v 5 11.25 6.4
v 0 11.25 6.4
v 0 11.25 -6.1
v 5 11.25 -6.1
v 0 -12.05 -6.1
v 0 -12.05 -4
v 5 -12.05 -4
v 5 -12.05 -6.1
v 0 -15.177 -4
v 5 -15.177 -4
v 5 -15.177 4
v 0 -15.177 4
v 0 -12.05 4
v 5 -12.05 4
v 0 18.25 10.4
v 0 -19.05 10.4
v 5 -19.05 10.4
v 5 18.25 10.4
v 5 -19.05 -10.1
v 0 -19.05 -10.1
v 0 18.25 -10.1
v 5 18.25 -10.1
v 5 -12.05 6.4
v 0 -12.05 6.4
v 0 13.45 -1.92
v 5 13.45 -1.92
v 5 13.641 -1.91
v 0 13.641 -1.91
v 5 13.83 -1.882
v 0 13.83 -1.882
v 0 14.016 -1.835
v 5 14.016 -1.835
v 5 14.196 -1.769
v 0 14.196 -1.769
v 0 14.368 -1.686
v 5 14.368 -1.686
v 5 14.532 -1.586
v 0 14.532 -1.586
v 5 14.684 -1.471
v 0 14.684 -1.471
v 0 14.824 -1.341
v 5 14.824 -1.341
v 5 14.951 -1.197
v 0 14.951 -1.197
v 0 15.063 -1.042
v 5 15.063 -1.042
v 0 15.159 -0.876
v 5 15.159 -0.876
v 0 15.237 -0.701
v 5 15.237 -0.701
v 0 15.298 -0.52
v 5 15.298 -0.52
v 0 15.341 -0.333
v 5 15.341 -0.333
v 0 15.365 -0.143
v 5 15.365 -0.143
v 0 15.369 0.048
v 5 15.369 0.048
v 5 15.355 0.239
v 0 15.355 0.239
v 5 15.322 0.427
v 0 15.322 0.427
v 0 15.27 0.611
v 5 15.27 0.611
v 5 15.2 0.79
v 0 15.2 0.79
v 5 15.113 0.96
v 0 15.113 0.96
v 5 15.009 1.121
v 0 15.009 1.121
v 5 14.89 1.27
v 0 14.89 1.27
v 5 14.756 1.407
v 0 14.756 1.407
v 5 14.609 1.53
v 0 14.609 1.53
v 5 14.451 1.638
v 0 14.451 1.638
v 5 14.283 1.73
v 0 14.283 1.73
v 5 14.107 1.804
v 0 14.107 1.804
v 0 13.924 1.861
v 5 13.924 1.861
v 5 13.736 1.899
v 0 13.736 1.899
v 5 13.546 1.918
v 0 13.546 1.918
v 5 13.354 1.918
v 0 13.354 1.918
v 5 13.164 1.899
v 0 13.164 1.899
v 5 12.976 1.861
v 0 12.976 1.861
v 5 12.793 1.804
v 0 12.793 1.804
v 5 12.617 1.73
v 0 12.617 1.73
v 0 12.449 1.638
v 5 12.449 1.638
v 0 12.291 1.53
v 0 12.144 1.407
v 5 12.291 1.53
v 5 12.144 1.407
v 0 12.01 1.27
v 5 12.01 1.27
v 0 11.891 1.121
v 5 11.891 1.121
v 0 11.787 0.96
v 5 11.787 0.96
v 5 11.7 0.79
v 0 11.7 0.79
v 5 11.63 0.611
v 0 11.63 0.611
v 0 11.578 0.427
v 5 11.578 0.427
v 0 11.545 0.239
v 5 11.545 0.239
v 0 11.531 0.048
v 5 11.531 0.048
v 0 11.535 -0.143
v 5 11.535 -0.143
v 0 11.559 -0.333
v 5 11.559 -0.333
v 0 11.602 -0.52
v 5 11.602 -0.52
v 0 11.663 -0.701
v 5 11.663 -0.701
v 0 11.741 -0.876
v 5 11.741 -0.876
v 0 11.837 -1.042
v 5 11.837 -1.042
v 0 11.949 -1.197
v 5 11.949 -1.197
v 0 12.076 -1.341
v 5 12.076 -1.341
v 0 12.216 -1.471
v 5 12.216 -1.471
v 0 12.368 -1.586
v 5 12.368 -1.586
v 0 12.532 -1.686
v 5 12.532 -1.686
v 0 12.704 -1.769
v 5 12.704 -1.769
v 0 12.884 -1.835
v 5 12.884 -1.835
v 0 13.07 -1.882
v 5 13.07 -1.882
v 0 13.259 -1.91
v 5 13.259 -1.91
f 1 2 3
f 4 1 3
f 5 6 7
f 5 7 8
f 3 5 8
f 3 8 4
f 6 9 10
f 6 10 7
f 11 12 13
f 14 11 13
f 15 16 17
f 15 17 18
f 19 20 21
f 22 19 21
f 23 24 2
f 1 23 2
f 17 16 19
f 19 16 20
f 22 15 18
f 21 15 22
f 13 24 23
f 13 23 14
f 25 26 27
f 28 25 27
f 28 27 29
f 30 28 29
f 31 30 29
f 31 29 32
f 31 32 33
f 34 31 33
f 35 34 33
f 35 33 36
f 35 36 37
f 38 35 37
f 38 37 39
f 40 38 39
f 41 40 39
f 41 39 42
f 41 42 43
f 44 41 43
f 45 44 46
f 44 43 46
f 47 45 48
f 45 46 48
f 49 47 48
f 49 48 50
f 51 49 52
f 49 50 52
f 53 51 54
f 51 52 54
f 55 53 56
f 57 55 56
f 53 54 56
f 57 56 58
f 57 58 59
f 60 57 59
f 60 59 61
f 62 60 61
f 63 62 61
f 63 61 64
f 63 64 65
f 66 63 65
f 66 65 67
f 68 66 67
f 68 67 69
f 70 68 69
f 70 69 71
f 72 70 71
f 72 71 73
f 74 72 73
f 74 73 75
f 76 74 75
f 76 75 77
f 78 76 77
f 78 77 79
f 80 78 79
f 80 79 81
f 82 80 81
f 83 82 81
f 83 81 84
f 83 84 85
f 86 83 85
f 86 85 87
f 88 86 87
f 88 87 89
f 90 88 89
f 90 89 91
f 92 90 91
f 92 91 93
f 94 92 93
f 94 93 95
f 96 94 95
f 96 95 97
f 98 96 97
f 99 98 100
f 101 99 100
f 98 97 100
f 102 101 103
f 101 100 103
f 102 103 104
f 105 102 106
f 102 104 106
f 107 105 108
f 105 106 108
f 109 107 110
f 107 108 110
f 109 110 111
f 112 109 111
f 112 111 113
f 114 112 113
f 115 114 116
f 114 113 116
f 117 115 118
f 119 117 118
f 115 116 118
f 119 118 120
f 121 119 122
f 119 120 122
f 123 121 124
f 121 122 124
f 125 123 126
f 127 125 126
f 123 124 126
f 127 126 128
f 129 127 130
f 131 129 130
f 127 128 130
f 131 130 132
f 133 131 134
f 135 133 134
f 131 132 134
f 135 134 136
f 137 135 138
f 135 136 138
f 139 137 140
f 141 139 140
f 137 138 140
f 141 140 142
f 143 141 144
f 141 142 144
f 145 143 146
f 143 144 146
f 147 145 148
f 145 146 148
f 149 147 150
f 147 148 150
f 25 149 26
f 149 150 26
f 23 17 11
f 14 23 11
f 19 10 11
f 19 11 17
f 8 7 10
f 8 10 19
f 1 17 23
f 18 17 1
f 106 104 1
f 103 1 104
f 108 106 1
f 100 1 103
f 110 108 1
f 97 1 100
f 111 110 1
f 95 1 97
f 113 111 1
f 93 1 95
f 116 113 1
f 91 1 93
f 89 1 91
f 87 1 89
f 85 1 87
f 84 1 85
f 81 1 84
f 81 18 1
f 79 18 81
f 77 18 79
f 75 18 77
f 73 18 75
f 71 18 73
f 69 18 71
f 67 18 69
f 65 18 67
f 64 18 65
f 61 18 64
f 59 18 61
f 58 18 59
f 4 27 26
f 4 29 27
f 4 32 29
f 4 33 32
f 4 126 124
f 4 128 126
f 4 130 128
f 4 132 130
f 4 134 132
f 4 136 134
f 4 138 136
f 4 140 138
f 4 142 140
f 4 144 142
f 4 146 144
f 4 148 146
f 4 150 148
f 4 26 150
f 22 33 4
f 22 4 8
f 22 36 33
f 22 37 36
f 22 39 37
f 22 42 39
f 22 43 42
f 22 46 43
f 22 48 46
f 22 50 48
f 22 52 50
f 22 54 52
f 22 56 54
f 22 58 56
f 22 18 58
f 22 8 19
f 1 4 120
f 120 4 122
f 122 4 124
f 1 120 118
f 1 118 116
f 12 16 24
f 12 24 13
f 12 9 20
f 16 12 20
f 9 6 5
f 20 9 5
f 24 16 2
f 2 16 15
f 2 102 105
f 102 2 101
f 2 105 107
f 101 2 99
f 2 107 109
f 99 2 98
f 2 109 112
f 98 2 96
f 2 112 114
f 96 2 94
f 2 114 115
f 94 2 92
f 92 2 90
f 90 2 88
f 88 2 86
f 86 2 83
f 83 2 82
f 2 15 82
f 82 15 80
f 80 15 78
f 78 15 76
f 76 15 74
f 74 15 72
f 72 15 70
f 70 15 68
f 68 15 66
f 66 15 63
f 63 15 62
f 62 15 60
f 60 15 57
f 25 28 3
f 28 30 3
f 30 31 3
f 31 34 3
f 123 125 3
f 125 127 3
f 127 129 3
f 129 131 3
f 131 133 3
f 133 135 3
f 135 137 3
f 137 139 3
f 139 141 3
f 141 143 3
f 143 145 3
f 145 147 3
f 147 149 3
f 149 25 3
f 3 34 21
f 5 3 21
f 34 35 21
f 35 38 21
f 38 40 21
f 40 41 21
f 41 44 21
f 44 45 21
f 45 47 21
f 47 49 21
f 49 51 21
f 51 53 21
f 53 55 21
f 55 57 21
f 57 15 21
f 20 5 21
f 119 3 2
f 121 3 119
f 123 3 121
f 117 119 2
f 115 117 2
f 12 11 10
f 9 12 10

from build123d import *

# Parameters (mm, degrees)
SKETCH1_W           = 20.5
SKETCH1_H           = 37.3
SKETCH1_W_2         = 12.5
SKETCH1_H_2         = 23.3
BOSS_EXTRUDE1_DEPTH = 5
SKETCH2_R           = 1.92
CUT_EXTRUDE1_DEPTH  = 13
SKETCH4_W           = 8
SKETCH4_H           = 3.126799126
CUT_EXTRUDE3_DEPTH  = 20


with BuildPart() as part:
    # Sketch1 → Boss-Extrude1 (new body)
    with BuildSketch(Plane(origin=(0, 0, 0), x_dir=(0, 0, -1), z_dir=(1, 0, 0))):
        with Locations((-0.15, -0.4)):
            Rectangle(SKETCH1_W, SKETCH1_H)
        with Locations((-0.15, -0.4)):
            Rectangle(SKETCH1_W_2, SKETCH1_H_2, mode=Mode.SUBTRACT)
    extrude(amount=BOSS_EXTRUDE1_DEPTH)

    # Sketch2 → Cut-Extrude1 (cut)
    with BuildSketch(Plane(origin=(5, 0, 0), x_dir=(0, 0, -1), z_dir=(1, 0, 0))):
        with Locations((0, 13.45)):
            Circle(SKETCH2_R)
    extrude(amount=-CUT_EXTRUDE1_DEPTH, mode=Mode.SUBTRACT)

    # Sketch4 → Cut-Extrude3 (cut)
    with BuildSketch(Plane(origin=(5, 0, 0), x_dir=(0, 0, -1), z_dir=(1, 0, 0))):
        with Locations((0, -13.613399563)):
            Rectangle(SKETCH4_W, SKETCH4_H)
    extrude(amount=-CUT_EXTRUDE3_DEPTH, mode=Mode.SUBTRACT)


solid = part.part
